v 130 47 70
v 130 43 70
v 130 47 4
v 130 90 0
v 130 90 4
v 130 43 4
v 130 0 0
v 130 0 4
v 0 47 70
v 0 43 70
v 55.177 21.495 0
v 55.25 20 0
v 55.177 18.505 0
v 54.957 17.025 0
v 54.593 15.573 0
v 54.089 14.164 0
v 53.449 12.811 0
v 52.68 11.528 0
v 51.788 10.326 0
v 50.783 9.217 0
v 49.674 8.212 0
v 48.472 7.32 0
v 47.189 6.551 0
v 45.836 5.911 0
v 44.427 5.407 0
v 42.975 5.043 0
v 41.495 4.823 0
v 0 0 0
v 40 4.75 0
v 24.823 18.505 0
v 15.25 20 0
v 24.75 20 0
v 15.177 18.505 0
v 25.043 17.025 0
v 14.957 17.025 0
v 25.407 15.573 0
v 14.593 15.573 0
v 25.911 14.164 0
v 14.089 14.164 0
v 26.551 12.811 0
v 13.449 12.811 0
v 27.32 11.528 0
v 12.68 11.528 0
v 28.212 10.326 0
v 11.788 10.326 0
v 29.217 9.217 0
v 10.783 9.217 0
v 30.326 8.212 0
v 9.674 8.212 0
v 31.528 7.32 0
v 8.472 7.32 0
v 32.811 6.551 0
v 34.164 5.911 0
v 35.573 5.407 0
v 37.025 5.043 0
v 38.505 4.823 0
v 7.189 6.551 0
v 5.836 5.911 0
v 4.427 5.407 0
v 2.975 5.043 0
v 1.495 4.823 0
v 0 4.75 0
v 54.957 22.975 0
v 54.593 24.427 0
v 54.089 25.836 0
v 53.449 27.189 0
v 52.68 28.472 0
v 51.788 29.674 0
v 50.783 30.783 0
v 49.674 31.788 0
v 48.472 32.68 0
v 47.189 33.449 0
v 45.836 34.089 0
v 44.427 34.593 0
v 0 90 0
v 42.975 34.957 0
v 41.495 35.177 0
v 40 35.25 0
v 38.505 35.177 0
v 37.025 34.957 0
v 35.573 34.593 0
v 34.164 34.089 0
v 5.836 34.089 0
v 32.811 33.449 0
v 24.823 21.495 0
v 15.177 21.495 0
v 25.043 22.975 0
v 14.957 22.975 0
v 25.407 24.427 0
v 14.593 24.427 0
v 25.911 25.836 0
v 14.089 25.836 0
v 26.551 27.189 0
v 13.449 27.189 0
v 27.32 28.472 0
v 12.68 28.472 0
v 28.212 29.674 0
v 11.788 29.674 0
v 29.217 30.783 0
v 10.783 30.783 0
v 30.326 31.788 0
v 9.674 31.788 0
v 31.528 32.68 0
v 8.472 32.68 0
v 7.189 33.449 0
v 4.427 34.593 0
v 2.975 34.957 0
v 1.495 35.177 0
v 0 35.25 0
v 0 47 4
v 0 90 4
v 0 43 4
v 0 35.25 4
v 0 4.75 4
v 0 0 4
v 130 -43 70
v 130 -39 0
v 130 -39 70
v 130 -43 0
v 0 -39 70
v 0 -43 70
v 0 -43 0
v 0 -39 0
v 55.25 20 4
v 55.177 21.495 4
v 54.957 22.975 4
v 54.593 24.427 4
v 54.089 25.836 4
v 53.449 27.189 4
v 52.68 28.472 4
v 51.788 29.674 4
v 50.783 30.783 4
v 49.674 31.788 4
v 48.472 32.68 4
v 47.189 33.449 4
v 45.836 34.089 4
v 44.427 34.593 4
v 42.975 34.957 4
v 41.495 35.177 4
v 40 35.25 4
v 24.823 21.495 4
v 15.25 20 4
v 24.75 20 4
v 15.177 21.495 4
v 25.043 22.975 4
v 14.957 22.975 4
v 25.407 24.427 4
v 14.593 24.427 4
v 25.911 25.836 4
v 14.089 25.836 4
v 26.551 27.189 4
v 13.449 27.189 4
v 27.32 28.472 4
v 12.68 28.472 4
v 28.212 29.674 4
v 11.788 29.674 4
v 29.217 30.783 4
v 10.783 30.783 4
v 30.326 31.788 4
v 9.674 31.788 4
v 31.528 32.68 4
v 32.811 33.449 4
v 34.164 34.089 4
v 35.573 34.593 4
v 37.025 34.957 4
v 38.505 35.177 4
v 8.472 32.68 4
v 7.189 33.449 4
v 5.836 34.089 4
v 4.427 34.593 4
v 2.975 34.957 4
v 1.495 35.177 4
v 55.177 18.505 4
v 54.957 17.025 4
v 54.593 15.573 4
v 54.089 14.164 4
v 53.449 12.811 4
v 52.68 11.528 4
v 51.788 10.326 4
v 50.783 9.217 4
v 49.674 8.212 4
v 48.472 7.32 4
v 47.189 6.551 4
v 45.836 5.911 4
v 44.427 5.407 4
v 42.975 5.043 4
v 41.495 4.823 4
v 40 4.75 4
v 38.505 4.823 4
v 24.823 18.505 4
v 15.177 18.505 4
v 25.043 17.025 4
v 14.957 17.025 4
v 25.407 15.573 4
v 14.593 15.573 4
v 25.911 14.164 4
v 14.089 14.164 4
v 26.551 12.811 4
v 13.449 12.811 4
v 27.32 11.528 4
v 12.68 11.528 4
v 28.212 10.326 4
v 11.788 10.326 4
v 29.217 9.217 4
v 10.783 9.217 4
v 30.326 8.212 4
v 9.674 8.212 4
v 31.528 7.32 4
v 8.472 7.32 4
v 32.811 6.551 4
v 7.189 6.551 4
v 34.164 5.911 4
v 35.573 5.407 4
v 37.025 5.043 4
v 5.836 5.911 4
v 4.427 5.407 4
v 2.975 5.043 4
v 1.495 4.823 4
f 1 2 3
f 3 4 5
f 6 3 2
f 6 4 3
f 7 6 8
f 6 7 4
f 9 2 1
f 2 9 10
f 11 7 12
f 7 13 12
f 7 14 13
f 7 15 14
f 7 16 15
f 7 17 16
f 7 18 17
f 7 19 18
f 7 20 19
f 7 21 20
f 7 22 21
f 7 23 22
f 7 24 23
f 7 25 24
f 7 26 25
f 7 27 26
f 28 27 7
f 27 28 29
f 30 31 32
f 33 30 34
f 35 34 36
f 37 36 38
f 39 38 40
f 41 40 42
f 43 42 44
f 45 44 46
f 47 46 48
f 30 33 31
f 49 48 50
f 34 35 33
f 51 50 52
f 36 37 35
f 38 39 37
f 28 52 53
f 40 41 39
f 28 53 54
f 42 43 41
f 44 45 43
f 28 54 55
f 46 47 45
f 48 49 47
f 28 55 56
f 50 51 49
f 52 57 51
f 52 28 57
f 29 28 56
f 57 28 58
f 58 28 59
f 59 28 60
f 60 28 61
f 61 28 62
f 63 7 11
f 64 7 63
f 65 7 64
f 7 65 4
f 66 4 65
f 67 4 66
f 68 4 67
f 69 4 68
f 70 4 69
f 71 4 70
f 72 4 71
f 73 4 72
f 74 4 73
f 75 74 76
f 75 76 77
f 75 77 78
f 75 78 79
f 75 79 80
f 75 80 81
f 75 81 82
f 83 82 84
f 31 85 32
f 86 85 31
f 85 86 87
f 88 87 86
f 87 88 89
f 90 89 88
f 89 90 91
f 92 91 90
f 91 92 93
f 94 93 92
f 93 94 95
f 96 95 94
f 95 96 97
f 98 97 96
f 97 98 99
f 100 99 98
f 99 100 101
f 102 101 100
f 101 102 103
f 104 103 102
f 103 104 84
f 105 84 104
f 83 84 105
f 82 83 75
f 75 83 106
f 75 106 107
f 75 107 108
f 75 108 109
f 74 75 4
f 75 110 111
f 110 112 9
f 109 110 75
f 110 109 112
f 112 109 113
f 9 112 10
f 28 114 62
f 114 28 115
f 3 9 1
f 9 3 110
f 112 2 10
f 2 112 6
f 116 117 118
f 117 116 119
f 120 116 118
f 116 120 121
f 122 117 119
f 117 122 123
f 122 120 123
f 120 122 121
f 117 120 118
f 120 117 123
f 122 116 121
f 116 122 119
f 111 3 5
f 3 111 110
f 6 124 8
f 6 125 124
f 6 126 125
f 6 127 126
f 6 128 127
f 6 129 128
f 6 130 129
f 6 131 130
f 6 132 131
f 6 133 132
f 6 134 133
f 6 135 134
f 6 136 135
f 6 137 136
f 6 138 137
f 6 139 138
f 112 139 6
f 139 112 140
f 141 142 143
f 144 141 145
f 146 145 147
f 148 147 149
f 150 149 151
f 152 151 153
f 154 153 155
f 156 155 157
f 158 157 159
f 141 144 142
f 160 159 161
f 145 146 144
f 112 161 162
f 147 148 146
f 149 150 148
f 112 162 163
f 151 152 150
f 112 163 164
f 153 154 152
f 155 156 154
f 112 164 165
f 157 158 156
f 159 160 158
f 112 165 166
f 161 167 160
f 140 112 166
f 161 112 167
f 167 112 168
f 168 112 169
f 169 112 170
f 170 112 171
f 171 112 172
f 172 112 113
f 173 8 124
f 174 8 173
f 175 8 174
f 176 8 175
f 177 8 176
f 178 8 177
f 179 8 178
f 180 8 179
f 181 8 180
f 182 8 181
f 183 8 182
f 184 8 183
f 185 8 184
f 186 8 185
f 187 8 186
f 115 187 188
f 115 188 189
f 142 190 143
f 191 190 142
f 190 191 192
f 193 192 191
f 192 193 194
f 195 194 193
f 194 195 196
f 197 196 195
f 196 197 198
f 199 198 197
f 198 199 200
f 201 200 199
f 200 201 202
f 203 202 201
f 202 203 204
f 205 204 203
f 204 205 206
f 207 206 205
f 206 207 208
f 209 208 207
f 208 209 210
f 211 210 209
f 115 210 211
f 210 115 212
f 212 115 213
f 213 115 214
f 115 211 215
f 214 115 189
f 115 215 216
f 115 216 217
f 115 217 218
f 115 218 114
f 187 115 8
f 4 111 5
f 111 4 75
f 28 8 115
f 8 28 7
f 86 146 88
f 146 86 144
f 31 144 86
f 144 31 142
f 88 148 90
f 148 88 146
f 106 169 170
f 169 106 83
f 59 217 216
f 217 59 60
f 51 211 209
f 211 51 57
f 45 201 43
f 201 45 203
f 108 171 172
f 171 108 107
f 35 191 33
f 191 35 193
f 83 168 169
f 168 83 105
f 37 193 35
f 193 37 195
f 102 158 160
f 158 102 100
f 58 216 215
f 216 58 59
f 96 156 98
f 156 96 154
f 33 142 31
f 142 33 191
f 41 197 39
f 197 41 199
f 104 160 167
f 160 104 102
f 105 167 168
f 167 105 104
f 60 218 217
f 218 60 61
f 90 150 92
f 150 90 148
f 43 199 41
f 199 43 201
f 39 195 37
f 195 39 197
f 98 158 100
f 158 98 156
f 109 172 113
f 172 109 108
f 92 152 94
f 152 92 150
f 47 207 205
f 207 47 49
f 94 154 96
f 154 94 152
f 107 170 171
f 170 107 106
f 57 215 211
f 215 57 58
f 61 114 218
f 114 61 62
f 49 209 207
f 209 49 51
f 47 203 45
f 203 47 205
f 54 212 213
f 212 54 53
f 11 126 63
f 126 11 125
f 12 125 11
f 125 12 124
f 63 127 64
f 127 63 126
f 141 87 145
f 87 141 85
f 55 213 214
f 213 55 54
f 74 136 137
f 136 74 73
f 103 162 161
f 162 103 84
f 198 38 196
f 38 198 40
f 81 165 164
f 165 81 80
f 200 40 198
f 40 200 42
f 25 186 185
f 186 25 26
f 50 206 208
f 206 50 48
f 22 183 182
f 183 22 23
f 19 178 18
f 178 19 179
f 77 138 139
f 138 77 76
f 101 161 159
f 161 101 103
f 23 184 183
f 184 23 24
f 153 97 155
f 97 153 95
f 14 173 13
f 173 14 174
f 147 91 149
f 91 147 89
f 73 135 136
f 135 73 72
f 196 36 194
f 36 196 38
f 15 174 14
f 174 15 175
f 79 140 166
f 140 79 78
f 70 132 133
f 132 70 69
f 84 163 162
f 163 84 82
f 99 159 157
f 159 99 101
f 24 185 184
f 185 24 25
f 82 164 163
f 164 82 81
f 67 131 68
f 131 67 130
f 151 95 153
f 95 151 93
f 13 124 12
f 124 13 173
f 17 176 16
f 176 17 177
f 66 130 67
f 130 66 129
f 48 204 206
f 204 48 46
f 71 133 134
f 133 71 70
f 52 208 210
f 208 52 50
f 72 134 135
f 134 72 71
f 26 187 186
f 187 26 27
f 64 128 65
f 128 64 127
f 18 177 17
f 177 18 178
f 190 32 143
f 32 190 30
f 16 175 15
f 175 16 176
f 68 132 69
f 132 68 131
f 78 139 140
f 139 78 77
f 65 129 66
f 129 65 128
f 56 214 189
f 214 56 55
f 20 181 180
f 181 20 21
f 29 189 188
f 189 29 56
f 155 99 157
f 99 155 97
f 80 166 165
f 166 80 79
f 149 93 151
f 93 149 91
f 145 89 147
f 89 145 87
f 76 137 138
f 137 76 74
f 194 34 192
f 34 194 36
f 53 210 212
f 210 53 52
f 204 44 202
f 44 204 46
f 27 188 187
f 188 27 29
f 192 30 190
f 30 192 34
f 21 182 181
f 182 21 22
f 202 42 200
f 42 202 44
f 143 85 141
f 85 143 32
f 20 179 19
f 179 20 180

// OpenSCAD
// --- Dimensions in mm ---

plate_length_X = 130;      // Total length along X axis of the base plate
plate_width_Y = 90;        // Total width along Y axis of the base plate
plate_thickness = 4;       // Thickness of the base plate (Z dimension)
tube_hole_diameter = 30.5; // Diameter of the holes for Falcon tubes
tube_hole_radius = tube_hole_diameter / 2;

wall_height = 70;          // Height the side walls rise to from the base plate
wall_thickness_Y = 4;     // Thickness of the long side walls (in Y direction)

spacing_X = 40;            // Center-to-center spacing between holes along X
spacing_Y = 40;            // Center-to-center spacing between holes along Y

// --- Global Settings ---
$fn = 64; // High resolution for curves

// --- Calculations ---

// Plate is centered at (0, 0). X runs from -65 to 65. Y runs from -45 to 45.

// X positions: 3 tubes along X (indices 1, 2, 3)
// Centers should be placed symmetrically around X=0.
x_positions = [
    -spacing_X, // Center of the first tube group relative to center line
     0,          // Center of the second tube group
     spacing_X  // Center of the third tube group
];

// Y positions: 2 rows along Y (indices 1, 2)
// Centers should be placed symmetrically around Y=0.
y_positions = [
    -spacing_Y / 2, // Row 1 center
     spacing_Y / 2  // Row 2 center
];


// --- Module Definitions ---

// Creates the main base plate structure
module base_plate() {
    cube([plate_length_X, plate_width_Y, plate_thickness]);
}

// Creates one through-hole centered at (x, y)
module tube_hole(x_center, y_center) {
    // Extend slightly past the top and bottom of the base plate for clean cutting
    translate([x_center, y_center, -0.1]) 
    cylinder(h = plate_thickness + 0.2, r = tube_hole_radius);
}

// Creates the two long side walls rising from the base plate
module side_wall() {
    // The wall is 130mm (X) long and 4mm thick (Y). It rises to Z=70.
    // Long edges are at Y = +/- (plate_width_Y / 2).
    // Wall thickness is in Y direction, so it occupies a slice of width 4mm centered on the edge line.

    // Wall 1 (Positive Y side) - Centered at Y = plate_width_Y/2
    translate([0, plate_width_Y/2 - wall_thickness_Y/2, 0]) {
        cube([plate_length_X, wall_thickness_Y, wall_height]);
    }

    // Wall 2 (Negative Y side) - Centered at Y = -plate_width_Y/2
    translate([0, -plate_width_Y/2 + wall_thickness_Y/2, 0]) {
        cube([plate_length_X, wall_thickness_Y, wall_height]);
    }
}


// --- Assembly ---

difference() {
    // 1. Base Plate (The main body) and Side Walls combined
    union() {
        base_plate();

        // 2. Side Walls (These extend up from the plate)
        side_wall();
    }

    // 3. Cutouts: Holes for tubes and material removal through walls

    // A. Tube Holes (6 holes in the base plate)
    for (i = [0 : len(x_positions)-1]) {
        for (j = [0 : len(y_positions)-1]) {
            translate([x_positions[i], y_positions[j], 0]) {
                tube_hole(0, 0); // The tube_hole module is designed to be translated externally
            }
        }
    }

    // B. Cutting through the side walls (to ensure tubes pass through)
    for (i = [0 : len(x_positions)-1]) {
        for (j = [0 : len(y_positions)-1]) {

            // Hole centered at X=x_positions[i], Y=y_positions[j]
            // Cut deep enough to pass through the entire structure (plate + walls)
            translate([x_positions[i], y_positions[j], -0.1]) {
                cylinder(h = wall_height + plate_thickness + 2, r = tube_hole_radius);
            }
        }
    }

}
